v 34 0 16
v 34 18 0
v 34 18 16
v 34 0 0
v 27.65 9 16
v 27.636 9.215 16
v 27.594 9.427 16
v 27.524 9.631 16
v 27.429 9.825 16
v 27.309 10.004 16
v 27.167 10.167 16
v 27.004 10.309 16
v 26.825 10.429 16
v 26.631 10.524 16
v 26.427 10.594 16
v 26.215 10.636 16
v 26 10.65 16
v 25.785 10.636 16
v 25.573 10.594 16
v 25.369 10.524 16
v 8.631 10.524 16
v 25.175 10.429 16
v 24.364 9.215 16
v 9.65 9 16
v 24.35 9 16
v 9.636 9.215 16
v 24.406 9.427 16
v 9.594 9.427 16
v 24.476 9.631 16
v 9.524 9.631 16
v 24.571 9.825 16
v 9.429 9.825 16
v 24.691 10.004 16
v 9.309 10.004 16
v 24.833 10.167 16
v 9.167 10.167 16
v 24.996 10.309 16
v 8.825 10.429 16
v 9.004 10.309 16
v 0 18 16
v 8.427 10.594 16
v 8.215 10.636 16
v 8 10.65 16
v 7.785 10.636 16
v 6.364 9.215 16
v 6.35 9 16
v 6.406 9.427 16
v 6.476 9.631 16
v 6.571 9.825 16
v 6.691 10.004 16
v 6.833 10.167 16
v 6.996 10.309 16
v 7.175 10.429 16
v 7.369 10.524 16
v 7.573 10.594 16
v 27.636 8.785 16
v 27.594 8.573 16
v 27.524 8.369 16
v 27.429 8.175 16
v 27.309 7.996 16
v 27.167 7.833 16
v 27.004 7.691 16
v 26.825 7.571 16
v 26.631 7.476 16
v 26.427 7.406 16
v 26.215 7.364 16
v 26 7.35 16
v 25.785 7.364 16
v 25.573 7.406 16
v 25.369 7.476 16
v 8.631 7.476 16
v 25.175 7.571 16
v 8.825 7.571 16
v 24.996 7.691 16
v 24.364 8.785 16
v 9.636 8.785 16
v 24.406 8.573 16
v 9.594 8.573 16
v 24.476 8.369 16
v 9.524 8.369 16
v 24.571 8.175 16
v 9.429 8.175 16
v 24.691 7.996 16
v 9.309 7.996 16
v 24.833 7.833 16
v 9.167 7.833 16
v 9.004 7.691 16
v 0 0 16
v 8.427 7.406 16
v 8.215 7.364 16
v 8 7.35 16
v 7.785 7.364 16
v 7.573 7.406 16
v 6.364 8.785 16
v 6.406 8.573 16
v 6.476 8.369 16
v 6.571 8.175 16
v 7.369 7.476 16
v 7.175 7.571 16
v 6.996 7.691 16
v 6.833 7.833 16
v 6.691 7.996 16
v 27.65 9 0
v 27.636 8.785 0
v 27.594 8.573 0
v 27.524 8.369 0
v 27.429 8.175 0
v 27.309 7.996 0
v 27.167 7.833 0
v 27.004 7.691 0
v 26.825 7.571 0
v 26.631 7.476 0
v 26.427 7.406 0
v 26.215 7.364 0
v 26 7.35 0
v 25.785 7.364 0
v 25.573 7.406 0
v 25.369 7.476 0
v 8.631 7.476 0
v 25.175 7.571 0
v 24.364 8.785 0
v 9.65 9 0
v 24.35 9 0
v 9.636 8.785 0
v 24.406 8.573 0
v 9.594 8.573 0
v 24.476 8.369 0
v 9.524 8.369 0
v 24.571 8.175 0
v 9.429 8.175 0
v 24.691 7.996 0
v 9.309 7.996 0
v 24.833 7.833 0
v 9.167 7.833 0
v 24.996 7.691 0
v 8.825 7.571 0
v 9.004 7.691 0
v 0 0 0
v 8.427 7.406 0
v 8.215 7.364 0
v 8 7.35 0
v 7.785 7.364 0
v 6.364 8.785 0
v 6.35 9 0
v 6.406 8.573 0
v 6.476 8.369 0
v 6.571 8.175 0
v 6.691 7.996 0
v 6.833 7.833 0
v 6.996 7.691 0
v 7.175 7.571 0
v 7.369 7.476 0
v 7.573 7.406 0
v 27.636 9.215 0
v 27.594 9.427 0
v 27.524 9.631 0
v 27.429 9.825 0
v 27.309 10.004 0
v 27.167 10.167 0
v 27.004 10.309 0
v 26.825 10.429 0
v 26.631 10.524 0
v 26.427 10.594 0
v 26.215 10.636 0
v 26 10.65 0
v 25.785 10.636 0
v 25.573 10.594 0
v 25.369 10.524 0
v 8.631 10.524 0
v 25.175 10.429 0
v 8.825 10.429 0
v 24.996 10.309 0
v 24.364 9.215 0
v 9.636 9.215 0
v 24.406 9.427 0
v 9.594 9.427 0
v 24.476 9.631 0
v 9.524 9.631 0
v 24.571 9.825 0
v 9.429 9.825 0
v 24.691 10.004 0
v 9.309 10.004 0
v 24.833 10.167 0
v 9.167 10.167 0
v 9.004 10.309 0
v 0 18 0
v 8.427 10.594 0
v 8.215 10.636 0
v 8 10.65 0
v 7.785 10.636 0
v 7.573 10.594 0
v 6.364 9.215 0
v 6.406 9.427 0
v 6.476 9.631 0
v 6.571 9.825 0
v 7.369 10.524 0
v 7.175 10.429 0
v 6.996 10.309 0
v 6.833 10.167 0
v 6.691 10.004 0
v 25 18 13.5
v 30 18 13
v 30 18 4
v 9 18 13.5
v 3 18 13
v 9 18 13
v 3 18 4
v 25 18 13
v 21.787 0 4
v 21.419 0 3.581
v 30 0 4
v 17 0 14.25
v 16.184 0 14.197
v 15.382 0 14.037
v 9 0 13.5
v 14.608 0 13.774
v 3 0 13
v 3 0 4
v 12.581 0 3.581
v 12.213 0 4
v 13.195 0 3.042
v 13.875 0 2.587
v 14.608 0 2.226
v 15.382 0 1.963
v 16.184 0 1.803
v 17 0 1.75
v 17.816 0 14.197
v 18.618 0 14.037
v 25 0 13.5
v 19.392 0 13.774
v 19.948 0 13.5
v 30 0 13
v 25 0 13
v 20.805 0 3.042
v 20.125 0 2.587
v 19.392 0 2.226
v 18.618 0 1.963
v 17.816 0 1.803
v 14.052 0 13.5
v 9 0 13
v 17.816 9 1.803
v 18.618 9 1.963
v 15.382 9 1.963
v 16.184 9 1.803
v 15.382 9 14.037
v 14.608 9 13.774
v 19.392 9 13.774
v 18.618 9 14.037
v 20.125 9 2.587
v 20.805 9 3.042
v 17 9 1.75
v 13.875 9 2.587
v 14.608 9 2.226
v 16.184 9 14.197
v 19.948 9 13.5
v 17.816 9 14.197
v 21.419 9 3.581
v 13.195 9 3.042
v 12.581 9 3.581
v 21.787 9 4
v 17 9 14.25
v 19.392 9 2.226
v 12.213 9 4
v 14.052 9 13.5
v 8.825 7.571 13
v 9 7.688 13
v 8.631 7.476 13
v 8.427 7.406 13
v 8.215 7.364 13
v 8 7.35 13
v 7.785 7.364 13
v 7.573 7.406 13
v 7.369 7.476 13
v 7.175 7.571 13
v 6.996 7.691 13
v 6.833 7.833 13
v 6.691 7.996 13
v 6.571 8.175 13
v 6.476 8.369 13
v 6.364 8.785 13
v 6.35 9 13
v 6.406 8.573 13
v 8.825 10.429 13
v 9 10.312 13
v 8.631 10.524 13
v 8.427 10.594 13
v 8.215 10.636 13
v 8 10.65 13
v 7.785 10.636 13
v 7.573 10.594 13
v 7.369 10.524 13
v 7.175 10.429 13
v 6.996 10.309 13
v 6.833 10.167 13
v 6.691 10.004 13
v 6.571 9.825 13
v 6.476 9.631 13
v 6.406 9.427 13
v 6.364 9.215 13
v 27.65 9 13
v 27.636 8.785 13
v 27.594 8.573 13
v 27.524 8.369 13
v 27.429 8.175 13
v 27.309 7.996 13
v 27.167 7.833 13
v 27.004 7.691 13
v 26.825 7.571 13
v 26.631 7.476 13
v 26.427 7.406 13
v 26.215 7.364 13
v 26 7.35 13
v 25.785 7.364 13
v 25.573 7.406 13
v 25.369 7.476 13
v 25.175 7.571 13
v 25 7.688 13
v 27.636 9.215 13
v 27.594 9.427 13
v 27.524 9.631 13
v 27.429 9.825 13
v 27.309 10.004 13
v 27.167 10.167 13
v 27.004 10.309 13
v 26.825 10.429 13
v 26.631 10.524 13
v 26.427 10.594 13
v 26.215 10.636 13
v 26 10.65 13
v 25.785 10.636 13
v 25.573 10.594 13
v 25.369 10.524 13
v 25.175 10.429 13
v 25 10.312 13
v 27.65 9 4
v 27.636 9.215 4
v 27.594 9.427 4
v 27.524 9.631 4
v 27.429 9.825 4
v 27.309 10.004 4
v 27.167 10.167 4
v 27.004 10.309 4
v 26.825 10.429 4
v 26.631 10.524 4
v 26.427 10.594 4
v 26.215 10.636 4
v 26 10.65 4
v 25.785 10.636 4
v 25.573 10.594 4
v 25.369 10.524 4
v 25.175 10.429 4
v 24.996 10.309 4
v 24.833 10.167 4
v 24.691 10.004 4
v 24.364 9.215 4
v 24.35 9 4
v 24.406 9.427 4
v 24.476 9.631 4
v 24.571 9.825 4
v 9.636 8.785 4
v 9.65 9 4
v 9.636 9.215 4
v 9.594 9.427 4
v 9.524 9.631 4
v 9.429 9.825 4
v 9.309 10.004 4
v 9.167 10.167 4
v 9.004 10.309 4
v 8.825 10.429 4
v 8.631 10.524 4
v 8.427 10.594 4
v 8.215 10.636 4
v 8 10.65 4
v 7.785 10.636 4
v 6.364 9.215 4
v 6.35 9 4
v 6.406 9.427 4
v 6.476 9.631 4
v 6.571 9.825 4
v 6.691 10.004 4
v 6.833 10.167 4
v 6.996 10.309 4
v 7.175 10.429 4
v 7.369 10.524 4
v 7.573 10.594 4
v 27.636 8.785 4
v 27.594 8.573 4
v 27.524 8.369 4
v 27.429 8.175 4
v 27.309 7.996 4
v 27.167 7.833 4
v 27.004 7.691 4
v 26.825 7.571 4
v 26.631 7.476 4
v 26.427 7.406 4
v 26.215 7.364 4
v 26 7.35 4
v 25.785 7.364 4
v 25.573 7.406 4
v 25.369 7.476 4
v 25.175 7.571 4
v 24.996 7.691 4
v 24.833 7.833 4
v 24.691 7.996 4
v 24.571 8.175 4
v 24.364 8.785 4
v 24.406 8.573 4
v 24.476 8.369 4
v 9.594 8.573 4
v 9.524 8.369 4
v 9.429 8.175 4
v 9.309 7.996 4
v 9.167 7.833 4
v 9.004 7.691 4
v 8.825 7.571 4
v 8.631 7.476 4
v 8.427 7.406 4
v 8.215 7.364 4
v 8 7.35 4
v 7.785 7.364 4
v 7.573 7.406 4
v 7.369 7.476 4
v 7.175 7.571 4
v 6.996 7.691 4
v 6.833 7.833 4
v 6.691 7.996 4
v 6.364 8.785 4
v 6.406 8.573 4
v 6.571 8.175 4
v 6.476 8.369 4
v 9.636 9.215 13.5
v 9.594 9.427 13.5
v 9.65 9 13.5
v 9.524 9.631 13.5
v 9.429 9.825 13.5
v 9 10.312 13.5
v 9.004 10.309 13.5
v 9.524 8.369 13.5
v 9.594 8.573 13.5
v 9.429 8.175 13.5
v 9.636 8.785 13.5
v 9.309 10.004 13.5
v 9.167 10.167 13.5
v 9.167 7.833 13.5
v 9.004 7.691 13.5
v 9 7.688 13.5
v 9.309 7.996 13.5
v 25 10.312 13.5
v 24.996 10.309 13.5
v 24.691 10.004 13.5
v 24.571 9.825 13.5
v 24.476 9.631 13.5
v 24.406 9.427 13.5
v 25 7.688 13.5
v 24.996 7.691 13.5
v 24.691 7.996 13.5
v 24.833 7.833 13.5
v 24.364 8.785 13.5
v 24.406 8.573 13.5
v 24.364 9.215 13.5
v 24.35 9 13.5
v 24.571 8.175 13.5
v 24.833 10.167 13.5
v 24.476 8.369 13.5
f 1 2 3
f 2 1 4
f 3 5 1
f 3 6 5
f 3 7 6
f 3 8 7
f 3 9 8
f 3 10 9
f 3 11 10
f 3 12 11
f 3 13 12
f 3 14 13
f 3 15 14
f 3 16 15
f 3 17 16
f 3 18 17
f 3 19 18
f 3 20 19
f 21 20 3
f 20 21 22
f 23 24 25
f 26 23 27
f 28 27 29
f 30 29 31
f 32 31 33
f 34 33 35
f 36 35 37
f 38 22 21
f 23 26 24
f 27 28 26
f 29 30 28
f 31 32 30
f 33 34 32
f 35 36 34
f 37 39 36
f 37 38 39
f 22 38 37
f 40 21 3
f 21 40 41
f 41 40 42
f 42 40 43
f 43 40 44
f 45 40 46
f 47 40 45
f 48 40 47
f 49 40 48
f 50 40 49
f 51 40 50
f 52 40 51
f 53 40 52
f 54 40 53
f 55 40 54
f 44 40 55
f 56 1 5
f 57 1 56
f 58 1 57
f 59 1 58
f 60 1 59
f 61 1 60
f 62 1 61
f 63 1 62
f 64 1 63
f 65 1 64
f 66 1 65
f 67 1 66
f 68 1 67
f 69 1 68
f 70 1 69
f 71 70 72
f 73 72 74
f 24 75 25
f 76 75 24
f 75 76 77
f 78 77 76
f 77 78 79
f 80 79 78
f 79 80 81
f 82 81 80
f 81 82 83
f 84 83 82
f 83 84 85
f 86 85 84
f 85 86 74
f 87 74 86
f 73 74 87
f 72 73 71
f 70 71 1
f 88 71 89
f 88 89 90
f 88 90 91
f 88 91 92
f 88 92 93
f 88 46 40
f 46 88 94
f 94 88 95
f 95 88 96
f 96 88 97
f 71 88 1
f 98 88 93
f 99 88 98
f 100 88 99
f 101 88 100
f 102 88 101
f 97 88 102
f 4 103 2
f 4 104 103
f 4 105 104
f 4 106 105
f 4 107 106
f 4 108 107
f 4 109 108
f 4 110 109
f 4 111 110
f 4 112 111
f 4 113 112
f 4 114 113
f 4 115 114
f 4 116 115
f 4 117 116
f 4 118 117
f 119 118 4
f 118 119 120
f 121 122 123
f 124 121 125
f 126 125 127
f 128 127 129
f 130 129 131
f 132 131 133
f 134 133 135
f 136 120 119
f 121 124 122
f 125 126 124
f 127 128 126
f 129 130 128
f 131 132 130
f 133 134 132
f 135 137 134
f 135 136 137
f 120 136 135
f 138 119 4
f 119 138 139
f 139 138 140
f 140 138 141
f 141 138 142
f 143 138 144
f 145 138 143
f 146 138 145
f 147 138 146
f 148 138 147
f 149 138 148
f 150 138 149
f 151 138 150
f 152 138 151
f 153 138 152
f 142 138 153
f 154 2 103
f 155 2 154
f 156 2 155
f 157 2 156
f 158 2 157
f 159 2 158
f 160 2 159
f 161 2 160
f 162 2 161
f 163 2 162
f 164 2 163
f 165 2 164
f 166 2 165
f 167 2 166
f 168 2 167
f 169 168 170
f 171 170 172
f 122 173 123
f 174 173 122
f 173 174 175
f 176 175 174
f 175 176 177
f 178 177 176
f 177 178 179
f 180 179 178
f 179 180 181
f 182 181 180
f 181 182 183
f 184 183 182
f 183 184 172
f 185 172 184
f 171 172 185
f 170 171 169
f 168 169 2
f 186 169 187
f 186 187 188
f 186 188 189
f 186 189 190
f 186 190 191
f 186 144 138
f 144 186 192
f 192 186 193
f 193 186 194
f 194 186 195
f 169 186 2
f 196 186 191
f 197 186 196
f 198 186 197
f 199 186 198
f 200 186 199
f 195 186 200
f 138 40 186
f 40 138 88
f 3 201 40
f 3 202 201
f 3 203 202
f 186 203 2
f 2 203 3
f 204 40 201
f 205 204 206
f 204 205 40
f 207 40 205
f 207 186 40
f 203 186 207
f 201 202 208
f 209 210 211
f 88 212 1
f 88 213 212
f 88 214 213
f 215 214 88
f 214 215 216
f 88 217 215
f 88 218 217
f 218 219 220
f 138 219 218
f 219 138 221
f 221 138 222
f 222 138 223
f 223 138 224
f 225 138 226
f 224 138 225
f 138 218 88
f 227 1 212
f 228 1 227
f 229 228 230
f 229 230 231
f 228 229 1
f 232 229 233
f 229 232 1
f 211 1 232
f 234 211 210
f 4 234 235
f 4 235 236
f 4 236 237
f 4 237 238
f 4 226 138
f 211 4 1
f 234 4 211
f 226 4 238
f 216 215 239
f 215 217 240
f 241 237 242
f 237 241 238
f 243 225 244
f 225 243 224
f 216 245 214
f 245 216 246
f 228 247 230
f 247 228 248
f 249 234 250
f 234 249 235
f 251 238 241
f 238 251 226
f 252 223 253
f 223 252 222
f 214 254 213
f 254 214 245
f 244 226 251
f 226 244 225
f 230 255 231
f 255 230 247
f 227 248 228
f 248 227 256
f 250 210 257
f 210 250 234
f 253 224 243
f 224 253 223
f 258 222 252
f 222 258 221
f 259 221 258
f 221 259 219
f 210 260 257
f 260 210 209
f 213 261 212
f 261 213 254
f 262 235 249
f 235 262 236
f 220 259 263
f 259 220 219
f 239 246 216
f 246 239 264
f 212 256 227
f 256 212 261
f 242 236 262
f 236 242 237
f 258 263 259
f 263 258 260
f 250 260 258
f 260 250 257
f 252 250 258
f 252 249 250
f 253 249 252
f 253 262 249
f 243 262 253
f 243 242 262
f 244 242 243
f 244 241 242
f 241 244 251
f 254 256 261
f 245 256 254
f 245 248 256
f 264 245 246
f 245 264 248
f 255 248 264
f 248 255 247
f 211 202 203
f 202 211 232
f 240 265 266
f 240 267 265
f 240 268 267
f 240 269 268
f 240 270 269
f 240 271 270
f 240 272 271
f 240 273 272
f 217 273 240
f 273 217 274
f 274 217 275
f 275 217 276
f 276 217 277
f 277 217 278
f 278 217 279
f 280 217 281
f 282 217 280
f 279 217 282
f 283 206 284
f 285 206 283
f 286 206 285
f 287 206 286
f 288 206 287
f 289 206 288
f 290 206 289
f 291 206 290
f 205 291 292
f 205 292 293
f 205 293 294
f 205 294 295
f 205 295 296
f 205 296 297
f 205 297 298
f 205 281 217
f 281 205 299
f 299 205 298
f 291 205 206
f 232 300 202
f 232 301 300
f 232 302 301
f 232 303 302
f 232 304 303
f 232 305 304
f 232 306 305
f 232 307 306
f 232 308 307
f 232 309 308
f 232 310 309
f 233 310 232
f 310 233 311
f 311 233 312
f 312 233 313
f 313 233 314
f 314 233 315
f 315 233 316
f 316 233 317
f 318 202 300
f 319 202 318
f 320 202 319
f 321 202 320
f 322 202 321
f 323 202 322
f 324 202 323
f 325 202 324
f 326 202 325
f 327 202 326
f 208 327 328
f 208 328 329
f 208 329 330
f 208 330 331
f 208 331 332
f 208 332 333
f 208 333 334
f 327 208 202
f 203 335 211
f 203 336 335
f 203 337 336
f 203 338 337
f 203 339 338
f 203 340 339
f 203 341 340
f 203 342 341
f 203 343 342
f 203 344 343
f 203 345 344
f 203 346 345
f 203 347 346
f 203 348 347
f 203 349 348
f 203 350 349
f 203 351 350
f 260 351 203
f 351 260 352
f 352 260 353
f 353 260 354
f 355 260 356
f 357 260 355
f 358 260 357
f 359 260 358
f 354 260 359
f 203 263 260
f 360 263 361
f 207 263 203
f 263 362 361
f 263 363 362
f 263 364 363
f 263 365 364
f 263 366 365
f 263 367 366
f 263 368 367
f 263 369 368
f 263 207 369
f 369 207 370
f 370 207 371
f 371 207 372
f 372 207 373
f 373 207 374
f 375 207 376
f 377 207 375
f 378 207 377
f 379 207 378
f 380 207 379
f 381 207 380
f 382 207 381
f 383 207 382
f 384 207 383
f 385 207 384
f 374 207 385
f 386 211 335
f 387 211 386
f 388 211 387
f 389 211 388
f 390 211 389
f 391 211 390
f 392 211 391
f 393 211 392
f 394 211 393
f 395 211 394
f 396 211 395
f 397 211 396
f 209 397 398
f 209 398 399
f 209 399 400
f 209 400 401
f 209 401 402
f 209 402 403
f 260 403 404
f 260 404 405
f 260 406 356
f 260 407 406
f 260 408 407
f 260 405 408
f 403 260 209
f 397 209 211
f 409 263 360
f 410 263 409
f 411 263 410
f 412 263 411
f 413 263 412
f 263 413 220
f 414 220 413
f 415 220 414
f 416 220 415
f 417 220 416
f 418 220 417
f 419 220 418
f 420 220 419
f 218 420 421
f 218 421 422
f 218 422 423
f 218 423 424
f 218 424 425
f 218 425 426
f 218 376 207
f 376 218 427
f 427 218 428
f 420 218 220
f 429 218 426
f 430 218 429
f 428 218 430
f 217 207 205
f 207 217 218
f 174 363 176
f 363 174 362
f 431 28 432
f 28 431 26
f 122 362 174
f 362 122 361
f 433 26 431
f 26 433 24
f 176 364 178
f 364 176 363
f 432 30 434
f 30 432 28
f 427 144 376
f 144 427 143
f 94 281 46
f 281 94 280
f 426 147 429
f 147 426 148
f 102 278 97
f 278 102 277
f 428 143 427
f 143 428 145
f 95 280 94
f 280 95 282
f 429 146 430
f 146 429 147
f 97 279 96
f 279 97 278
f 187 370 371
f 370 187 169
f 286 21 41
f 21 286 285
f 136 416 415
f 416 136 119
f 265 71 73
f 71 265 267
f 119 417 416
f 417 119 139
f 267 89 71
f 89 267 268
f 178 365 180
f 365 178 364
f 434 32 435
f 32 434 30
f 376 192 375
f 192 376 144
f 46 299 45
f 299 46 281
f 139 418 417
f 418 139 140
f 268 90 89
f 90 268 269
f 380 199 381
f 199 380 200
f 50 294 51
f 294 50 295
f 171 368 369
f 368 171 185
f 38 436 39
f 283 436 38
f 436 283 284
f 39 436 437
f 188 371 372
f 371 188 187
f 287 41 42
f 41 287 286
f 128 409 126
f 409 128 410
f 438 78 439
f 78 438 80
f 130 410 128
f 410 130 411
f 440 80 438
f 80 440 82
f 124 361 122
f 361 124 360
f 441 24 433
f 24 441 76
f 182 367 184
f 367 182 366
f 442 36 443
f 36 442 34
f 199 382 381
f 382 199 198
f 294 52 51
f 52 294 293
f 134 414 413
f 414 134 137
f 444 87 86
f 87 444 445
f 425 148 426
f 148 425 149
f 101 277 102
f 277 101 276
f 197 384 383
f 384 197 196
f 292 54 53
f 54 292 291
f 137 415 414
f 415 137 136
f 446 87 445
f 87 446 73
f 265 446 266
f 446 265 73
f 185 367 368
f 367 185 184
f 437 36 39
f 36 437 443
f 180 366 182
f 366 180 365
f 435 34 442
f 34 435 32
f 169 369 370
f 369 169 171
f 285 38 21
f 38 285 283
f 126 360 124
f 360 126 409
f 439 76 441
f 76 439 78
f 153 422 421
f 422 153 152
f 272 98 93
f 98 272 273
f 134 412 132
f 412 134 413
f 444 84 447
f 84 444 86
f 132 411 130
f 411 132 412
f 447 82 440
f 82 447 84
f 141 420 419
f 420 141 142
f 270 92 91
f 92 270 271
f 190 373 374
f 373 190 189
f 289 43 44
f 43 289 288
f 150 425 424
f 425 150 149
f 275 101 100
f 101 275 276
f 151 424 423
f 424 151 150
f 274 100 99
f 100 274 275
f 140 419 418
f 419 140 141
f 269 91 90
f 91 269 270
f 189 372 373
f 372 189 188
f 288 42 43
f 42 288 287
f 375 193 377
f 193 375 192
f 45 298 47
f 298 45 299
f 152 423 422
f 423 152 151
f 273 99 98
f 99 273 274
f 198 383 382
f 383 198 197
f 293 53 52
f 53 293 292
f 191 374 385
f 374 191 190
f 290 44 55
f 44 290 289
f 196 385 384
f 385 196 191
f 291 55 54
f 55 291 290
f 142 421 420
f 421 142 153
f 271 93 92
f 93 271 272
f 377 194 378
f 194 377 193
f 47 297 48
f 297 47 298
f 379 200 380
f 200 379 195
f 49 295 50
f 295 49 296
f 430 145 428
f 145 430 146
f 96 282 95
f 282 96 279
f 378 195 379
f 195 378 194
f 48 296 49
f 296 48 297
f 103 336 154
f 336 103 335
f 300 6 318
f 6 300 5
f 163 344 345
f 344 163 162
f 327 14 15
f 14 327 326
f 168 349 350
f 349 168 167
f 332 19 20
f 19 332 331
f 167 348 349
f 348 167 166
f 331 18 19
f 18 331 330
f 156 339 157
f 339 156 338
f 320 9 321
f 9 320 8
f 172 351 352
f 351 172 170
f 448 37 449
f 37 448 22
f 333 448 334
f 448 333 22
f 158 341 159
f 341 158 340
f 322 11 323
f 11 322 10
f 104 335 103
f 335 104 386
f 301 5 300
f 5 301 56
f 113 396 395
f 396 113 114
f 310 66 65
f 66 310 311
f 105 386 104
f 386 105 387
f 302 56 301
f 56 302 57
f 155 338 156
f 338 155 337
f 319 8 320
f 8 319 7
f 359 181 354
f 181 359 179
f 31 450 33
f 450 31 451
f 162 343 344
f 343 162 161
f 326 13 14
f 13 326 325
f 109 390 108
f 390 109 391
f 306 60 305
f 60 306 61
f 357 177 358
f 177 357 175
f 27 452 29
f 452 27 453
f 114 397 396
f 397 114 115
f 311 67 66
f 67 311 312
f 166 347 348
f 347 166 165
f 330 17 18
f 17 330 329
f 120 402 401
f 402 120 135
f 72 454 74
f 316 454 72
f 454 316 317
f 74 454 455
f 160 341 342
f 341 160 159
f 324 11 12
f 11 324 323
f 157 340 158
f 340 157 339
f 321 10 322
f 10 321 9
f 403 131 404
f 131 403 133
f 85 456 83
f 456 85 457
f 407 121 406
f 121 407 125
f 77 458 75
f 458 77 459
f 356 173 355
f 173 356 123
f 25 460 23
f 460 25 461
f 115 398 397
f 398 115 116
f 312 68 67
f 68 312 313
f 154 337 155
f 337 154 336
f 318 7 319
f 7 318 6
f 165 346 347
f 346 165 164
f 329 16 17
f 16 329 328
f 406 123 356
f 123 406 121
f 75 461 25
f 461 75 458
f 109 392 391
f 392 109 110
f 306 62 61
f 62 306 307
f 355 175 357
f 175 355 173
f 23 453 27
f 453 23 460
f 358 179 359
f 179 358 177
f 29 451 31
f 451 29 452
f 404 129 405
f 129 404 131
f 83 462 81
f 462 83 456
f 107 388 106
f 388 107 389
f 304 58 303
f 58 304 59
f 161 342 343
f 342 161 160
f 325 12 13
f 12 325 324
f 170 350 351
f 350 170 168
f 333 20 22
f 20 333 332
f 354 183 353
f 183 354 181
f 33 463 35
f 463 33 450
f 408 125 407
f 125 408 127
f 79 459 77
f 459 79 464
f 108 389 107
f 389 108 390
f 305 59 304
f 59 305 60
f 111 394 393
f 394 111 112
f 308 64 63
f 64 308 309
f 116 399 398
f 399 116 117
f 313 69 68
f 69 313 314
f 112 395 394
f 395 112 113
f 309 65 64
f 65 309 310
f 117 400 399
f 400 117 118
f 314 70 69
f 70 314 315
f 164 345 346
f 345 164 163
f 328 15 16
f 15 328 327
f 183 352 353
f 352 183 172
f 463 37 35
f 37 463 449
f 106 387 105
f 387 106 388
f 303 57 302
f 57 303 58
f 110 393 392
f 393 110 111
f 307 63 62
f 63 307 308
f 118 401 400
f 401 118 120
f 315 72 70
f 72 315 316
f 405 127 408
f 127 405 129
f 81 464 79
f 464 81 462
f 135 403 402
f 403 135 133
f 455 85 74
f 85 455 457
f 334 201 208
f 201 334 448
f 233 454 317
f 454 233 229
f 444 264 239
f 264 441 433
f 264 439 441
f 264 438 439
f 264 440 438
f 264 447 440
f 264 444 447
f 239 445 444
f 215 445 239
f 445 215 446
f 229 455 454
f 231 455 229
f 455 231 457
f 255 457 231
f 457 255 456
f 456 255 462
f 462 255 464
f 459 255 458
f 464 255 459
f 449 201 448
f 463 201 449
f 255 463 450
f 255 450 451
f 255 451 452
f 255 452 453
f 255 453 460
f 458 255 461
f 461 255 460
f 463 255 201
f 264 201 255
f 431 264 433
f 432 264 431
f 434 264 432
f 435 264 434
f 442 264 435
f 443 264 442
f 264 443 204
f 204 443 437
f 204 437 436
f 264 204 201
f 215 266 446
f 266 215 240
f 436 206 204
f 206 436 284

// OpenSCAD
// N20 motor mount, print 4x, units mm
$fn=48; l=34; w=18; h=16; m3=3.3;
difference(){
 cube([l,w,h]);
 translate([l/2,w/2,h/2]) rotate([90,0,0]) cylinder(h=w+2,d=12.5);
 translate([3,-1,4]) cube([27,w+2,9]);
 translate([8,w/2,-1]) cylinder(h=h+2,d=m3);
 translate([26,w/2,-1]) cylinder(h=h+2,d=m3);
 translate([l/2-8,-1,h-5]) cube([16,w+2,2.5]);
}
